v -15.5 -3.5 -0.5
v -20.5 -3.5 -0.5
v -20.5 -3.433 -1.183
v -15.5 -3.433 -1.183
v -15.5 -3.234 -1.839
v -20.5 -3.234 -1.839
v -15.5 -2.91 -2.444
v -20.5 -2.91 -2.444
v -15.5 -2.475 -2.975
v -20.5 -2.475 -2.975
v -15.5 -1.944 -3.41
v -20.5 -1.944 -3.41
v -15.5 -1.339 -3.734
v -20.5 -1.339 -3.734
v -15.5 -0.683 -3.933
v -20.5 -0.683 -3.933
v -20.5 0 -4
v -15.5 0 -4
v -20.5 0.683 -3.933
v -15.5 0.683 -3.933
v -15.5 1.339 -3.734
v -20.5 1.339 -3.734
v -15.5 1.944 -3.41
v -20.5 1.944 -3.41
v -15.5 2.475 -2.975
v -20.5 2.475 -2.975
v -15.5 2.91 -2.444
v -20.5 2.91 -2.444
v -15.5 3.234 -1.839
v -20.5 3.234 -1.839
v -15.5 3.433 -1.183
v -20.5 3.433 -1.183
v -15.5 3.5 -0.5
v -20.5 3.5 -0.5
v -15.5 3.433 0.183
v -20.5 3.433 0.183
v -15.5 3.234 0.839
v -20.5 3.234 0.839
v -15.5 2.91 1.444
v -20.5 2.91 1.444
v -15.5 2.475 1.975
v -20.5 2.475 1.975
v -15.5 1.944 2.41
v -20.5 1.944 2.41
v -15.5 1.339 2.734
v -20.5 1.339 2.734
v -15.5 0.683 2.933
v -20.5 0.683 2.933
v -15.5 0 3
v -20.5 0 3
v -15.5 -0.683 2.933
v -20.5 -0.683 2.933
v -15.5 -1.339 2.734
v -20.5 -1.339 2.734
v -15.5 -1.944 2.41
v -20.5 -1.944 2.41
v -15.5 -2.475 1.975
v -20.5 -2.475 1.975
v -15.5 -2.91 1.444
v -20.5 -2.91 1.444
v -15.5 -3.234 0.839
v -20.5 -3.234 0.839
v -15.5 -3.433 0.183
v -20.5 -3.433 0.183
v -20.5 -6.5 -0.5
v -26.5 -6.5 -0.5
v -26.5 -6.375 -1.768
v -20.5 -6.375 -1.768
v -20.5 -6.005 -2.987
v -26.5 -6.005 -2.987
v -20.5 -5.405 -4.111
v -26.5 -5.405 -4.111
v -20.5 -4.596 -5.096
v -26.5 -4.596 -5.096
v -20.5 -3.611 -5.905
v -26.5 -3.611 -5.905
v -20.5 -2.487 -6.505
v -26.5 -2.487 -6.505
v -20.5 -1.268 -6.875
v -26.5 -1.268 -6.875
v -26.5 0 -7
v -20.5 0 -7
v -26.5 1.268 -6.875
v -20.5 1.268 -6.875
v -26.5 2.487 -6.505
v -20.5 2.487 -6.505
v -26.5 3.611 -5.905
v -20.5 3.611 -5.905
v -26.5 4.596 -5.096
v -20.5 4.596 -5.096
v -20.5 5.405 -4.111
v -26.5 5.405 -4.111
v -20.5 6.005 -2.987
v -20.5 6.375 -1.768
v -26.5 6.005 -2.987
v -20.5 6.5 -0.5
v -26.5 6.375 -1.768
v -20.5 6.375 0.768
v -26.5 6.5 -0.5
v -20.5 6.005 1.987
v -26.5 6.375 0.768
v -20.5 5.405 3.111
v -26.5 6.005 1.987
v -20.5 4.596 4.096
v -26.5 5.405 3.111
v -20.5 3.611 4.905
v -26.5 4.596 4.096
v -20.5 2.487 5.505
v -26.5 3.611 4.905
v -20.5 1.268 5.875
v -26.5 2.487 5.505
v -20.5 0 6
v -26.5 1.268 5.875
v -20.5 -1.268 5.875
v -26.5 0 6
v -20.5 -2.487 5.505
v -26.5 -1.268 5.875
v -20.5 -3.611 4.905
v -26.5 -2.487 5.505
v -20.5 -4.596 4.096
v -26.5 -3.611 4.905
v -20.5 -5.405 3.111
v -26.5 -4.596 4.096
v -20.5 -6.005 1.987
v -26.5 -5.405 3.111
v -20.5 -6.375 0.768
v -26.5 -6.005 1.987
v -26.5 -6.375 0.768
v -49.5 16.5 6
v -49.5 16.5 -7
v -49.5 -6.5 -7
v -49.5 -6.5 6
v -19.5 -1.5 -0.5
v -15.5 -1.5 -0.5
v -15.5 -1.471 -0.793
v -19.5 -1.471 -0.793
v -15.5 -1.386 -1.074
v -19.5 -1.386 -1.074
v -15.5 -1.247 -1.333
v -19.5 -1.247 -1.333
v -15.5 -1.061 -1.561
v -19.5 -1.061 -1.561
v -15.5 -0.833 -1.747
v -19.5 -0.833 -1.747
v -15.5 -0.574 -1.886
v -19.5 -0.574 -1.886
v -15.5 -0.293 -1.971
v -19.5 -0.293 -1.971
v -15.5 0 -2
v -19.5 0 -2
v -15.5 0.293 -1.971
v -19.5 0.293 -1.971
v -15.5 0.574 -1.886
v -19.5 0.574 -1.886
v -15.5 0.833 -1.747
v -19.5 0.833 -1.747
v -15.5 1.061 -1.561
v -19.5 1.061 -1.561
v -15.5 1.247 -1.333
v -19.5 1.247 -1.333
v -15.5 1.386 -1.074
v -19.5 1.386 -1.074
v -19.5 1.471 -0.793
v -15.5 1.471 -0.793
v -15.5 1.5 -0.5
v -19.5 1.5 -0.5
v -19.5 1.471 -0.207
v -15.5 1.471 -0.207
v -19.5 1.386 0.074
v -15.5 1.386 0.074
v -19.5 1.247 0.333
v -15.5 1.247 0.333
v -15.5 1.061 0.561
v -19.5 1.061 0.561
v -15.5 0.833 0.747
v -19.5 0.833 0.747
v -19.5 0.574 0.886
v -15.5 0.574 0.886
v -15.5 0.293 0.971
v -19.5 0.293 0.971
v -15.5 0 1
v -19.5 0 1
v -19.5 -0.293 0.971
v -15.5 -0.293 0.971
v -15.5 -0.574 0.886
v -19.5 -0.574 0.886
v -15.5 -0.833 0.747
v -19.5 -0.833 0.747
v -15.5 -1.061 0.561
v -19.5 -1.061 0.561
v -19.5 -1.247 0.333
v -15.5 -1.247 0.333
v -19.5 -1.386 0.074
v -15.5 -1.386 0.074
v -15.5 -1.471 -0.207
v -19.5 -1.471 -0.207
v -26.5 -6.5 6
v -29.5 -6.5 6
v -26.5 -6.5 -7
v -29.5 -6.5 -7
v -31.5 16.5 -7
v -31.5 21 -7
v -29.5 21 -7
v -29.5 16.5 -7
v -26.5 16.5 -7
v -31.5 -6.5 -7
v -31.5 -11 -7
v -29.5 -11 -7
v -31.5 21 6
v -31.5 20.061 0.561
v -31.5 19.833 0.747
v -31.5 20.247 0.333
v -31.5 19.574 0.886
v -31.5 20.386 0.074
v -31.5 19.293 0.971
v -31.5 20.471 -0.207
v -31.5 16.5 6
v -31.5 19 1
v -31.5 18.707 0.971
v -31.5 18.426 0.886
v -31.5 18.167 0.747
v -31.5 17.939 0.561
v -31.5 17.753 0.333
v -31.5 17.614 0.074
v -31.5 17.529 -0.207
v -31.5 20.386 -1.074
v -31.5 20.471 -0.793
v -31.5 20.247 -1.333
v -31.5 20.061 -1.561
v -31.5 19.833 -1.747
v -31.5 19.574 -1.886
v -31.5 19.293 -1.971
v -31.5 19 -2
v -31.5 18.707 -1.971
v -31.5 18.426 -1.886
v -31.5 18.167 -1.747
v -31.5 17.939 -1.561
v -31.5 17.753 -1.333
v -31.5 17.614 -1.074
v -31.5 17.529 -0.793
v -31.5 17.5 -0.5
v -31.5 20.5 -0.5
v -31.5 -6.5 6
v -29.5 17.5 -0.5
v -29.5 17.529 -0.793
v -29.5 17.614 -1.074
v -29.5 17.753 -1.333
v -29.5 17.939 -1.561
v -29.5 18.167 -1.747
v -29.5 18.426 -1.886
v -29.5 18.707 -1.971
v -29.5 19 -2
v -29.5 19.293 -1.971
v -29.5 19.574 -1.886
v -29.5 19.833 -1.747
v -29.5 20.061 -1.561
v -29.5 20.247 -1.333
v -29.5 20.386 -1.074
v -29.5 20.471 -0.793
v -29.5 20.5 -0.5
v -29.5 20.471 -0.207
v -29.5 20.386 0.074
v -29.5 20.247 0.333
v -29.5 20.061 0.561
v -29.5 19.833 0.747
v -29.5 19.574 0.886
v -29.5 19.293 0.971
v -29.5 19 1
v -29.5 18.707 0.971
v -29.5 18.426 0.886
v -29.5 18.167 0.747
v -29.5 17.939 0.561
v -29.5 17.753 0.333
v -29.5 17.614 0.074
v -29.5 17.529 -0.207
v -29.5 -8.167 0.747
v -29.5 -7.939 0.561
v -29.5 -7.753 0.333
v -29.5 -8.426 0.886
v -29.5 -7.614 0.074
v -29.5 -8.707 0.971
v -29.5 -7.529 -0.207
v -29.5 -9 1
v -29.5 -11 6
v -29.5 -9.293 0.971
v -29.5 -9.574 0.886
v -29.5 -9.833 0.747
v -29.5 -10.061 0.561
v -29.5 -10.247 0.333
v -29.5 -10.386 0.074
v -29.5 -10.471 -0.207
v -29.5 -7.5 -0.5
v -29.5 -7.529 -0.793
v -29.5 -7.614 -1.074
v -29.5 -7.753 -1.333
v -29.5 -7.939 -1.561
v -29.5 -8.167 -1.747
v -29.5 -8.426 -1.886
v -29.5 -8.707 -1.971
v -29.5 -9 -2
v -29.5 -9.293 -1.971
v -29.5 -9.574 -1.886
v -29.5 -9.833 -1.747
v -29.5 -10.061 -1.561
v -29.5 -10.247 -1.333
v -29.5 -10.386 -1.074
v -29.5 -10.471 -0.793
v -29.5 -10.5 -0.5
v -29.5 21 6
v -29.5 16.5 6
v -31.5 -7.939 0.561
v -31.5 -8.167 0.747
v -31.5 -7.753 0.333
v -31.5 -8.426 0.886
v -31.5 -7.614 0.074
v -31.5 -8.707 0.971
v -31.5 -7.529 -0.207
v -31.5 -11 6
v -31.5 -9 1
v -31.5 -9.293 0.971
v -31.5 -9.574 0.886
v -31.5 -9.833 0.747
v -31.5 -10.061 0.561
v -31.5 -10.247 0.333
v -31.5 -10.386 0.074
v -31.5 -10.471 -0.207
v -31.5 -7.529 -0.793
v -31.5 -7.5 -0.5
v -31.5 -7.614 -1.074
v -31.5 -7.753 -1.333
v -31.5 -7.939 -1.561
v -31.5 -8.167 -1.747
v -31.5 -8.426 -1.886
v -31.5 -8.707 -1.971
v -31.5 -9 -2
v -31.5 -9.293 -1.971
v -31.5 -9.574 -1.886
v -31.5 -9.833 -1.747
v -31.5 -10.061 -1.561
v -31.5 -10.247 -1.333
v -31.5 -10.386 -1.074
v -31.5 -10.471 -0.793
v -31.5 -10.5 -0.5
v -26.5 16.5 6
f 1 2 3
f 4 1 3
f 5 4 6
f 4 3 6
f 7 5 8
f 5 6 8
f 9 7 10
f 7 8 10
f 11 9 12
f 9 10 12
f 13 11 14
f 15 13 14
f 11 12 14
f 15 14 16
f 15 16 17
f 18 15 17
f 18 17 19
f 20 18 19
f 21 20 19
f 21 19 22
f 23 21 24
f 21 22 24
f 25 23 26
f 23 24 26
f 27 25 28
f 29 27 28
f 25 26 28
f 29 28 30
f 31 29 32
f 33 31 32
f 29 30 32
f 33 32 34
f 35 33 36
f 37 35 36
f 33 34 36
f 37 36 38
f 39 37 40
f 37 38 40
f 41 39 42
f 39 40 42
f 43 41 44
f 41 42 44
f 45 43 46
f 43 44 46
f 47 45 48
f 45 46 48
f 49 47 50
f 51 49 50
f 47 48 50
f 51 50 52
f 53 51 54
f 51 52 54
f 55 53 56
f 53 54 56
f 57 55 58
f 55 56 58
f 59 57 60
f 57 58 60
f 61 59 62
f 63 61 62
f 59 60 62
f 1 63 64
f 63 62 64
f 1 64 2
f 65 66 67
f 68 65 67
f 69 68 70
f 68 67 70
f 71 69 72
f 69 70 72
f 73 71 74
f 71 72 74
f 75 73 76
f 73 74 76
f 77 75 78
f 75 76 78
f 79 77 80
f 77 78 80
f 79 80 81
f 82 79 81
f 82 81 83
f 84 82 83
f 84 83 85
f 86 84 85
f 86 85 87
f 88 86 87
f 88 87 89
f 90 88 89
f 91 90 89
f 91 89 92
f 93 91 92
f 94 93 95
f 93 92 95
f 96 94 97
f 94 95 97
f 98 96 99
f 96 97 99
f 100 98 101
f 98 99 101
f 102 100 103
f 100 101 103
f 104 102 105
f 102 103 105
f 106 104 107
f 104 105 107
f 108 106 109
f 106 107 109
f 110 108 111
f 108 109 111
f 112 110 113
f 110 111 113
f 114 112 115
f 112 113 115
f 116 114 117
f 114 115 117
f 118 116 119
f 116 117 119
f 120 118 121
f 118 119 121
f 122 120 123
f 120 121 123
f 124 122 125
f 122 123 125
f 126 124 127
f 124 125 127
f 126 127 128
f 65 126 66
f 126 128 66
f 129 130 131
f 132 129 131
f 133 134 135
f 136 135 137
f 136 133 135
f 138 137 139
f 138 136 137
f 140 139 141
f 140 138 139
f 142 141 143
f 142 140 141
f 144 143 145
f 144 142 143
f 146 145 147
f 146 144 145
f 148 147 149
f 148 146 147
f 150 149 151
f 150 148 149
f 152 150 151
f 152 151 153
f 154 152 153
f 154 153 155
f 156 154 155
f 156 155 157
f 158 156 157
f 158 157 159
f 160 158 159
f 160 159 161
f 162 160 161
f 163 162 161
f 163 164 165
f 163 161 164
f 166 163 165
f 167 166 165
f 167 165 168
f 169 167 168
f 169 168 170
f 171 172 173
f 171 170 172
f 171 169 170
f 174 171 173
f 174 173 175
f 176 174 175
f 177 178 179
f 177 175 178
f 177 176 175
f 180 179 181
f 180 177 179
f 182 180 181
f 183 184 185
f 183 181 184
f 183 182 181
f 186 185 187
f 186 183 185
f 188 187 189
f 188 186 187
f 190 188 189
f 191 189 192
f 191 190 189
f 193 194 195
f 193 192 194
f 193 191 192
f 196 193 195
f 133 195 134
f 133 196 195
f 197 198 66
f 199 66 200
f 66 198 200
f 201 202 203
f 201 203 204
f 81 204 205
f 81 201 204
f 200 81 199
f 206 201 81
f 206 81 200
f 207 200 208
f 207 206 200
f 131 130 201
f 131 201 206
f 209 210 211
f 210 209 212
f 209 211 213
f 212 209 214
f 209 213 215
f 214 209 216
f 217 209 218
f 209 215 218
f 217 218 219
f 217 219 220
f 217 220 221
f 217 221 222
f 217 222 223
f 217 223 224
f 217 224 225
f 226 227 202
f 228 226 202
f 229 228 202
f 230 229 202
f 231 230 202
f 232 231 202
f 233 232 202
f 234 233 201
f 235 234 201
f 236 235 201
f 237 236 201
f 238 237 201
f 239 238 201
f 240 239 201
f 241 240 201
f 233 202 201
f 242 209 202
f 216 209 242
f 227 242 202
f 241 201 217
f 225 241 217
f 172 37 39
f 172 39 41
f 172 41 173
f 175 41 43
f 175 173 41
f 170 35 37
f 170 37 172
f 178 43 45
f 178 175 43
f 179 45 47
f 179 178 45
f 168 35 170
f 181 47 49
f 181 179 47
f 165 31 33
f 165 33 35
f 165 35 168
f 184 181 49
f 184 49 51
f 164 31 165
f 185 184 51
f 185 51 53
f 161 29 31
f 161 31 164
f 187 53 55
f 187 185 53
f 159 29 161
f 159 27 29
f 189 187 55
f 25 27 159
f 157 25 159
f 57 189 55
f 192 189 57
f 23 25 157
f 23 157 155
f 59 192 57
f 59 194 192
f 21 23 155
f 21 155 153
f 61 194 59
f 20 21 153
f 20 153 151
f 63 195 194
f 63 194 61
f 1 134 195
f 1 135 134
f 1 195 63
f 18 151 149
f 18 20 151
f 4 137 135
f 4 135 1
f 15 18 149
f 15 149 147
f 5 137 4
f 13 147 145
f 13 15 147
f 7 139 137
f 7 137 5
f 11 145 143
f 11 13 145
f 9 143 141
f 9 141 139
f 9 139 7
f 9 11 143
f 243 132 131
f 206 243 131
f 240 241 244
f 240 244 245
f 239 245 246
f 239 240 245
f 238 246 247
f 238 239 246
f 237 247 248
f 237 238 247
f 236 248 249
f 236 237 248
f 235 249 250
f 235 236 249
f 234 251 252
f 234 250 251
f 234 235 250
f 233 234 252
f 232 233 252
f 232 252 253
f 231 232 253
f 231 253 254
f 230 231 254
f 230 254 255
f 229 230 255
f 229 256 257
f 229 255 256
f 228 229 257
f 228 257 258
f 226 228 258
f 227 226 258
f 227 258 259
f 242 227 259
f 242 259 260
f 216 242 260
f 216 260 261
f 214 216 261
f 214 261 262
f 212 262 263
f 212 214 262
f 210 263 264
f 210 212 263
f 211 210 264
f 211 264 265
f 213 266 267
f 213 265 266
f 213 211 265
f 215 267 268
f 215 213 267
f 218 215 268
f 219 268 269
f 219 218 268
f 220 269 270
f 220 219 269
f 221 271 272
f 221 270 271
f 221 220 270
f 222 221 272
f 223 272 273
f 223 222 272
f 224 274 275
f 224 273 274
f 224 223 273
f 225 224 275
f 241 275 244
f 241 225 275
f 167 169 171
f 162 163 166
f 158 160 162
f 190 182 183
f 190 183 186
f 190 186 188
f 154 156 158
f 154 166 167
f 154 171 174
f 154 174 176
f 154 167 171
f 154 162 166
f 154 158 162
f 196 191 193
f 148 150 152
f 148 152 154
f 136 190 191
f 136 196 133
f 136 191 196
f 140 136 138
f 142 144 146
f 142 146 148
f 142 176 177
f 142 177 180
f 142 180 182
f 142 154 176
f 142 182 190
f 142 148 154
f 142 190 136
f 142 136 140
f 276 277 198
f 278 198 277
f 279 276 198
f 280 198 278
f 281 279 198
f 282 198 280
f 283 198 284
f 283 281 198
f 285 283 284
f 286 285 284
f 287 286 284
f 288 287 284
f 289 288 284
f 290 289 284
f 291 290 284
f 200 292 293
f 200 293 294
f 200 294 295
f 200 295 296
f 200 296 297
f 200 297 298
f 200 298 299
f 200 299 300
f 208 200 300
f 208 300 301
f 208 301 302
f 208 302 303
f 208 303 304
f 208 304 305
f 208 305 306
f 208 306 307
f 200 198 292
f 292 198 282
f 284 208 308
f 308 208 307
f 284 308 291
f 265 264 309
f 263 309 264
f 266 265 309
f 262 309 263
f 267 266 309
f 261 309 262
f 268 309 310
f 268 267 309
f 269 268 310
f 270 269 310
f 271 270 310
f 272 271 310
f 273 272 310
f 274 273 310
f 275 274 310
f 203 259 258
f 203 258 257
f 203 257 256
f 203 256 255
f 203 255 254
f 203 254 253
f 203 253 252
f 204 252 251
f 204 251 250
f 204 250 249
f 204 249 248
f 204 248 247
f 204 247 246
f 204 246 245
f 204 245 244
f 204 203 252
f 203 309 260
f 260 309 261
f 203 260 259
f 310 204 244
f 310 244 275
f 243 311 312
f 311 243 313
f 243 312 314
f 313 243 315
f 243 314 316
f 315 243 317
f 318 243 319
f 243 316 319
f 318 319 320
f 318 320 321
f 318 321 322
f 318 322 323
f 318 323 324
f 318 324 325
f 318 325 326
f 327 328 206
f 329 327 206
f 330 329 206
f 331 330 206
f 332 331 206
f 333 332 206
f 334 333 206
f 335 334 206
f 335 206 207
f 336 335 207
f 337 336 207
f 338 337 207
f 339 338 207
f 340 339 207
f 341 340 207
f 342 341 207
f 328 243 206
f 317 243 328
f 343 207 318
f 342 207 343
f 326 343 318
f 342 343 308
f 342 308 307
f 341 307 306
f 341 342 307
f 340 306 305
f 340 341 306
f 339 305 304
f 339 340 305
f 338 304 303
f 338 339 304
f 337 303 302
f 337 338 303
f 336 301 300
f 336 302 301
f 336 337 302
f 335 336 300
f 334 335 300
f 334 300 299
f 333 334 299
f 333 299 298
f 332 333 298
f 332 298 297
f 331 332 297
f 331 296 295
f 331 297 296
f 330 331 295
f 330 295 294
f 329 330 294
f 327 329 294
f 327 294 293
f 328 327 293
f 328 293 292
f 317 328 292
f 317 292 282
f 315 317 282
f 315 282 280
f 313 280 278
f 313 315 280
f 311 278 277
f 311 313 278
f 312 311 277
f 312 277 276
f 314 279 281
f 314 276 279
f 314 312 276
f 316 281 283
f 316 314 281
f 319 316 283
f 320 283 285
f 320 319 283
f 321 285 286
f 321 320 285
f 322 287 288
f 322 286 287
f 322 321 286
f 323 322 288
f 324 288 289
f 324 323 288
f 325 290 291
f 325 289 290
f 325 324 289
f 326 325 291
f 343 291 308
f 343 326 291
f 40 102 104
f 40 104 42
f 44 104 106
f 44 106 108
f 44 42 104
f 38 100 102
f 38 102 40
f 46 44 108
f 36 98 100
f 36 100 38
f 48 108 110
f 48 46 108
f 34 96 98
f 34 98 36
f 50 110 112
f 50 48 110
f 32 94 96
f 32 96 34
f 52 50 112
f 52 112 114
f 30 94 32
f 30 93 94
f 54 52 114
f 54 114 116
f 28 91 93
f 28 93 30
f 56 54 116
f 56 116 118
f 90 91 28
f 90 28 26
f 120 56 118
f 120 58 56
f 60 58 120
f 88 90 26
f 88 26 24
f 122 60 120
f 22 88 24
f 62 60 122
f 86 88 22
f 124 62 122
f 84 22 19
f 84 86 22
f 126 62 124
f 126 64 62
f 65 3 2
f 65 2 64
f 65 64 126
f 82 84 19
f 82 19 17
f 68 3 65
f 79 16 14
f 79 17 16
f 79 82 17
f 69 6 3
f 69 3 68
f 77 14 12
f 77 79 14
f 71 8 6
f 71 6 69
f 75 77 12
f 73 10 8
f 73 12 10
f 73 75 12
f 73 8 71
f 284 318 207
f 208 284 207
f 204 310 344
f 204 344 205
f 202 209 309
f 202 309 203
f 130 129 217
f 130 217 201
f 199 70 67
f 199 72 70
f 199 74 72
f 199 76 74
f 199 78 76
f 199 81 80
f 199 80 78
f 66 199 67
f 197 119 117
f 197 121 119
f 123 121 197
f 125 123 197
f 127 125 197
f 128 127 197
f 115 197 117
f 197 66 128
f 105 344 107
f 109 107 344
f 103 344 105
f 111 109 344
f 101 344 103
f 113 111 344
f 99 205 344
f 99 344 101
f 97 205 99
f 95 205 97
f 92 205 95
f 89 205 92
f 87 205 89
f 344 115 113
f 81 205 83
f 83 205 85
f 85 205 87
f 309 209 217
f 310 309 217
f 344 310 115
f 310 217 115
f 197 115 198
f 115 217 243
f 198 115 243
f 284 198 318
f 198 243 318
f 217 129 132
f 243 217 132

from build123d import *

# Parameters (mm, degrees)
CYLINDER010_R          = 1.5
CYLINDER010_DEPTH      = 10
CYLINDER013_R          = 1.5
CYLINDER013_DEPTH      = 5
CYLINDER014_R          = 1.5
CYLINDER014_DEPTH      = 10
CYLINDER011_R          = 3.5
CYLINDER011_DEPTH      = 5
BOX004_W               = 32
BOX004_H               = 13
BOX004_DEPTH           = 2
CYLINDER012_R          = 6.5
CYLINDER012_DEPTH      = 6
BOX005_W               = 23
BOX005_H               = 13
BOX005_DEPTH           = 23
CUT002_ROLL_ANGLE      = -90
CUT002_PLACEMENT_ANGLE = -90


with BuildPart() as zylinder010:
    # Cylinder010 → Cylinder010 (new body)
    with BuildSketch(Plane(origin=(25.5, 6.5, 13), x_dir=(1, 0, 0), z_dir=(0, 0, 1))):
        Circle(CYLINDER010_R)
    extrude(amount=CYLINDER010_DEPTH)


with BuildPart() as zylinder013:
    # Cylinder013 → Cylinder013 (new body)
    with BuildSketch(Plane(origin=(16.5, 6.5, 30), x_dir=(1, 0, 0), z_dir=(0, 0, 1))):
        Circle(CYLINDER013_R)
    extrude(amount=CYLINDER013_DEPTH)


with BuildPart() as fusion004:
    # Cylinder014 → Cylinder014 (new body)
    with BuildSketch(Plane(origin=(-2.5, 6.5, 13), x_dir=(1, 0, 0), z_dir=(0, 0, 1))):
        Circle(CYLINDER014_R)
    extrude(amount=CYLINDER014_DEPTH)

    # Fusion004: union Zylinder010, Zylinder013
    add(zylinder010.part)
    add(zylinder013.part)


with BuildPart() as zylinder011:
    # Cylinder011 → Cylinder011 (new body)
    with BuildSketch(Plane(origin=(16.5, 6.5, 29), x_dir=(1, 0, 0), z_dir=(0, 0, 1))):
        Circle(CYLINDER011_R)
    extrude(amount=CYLINDER011_DEPTH)


with BuildPart() as w_rfel004:
    # Box004 → Box004 (new body)
    with BuildSketch(Plane(origin=(-4.5, 0, 18), x_dir=(1, 0, 0), z_dir=(0, 0, 1))):
        with Locations((16, 6.5)):
            Rectangle(BOX004_W, BOX004_H)
    extrude(amount=BOX004_DEPTH)


with BuildPart() as zylinder012:
    # Cylinder012 → Cylinder012 (new body)
    with BuildSketch(Plane(origin=(16.5, 6.5, 23), x_dir=(1, 0, 0), z_dir=(0, 0, 1))):
        Circle(CYLINDER012_R)
    extrude(amount=CYLINDER012_DEPTH)


with BuildPart() as servo3:
    # Box005 → Box005 (new body)
    with BuildSketch(Plane.XY):
        with Locations((11.5, 6.5)):
            Rectangle(BOX005_W, BOX005_H)
    extrude(amount=BOX005_DEPTH)

    # Fusion005: union Zylinder011, Würfel004, Zylinder012
    add(zylinder011.part)
    add(w_rfel004.part)
    add(zylinder012.part)

    # Cut002: cut Fusion004
    add(fusion004.part, mode=Mode.SUBTRACT)


with BuildPart() as servo3_1:
    # Cut002 roll: moved
    add(servo3.part.rotate(Axis((0, 0, 0), (1, 0, 0)), CUT002_ROLL_ANGLE))


with BuildPart() as servo3_2:
    # Cut002 placement: moved
    add(servo3_1.part.moved(Location((-49.5, 16.5, 6))).rotate(Axis((-49.5, 16.5, 6), (0, 0, 1)), CUT002_PLACEMENT_ANGLE))


solid = servo3_2.part
